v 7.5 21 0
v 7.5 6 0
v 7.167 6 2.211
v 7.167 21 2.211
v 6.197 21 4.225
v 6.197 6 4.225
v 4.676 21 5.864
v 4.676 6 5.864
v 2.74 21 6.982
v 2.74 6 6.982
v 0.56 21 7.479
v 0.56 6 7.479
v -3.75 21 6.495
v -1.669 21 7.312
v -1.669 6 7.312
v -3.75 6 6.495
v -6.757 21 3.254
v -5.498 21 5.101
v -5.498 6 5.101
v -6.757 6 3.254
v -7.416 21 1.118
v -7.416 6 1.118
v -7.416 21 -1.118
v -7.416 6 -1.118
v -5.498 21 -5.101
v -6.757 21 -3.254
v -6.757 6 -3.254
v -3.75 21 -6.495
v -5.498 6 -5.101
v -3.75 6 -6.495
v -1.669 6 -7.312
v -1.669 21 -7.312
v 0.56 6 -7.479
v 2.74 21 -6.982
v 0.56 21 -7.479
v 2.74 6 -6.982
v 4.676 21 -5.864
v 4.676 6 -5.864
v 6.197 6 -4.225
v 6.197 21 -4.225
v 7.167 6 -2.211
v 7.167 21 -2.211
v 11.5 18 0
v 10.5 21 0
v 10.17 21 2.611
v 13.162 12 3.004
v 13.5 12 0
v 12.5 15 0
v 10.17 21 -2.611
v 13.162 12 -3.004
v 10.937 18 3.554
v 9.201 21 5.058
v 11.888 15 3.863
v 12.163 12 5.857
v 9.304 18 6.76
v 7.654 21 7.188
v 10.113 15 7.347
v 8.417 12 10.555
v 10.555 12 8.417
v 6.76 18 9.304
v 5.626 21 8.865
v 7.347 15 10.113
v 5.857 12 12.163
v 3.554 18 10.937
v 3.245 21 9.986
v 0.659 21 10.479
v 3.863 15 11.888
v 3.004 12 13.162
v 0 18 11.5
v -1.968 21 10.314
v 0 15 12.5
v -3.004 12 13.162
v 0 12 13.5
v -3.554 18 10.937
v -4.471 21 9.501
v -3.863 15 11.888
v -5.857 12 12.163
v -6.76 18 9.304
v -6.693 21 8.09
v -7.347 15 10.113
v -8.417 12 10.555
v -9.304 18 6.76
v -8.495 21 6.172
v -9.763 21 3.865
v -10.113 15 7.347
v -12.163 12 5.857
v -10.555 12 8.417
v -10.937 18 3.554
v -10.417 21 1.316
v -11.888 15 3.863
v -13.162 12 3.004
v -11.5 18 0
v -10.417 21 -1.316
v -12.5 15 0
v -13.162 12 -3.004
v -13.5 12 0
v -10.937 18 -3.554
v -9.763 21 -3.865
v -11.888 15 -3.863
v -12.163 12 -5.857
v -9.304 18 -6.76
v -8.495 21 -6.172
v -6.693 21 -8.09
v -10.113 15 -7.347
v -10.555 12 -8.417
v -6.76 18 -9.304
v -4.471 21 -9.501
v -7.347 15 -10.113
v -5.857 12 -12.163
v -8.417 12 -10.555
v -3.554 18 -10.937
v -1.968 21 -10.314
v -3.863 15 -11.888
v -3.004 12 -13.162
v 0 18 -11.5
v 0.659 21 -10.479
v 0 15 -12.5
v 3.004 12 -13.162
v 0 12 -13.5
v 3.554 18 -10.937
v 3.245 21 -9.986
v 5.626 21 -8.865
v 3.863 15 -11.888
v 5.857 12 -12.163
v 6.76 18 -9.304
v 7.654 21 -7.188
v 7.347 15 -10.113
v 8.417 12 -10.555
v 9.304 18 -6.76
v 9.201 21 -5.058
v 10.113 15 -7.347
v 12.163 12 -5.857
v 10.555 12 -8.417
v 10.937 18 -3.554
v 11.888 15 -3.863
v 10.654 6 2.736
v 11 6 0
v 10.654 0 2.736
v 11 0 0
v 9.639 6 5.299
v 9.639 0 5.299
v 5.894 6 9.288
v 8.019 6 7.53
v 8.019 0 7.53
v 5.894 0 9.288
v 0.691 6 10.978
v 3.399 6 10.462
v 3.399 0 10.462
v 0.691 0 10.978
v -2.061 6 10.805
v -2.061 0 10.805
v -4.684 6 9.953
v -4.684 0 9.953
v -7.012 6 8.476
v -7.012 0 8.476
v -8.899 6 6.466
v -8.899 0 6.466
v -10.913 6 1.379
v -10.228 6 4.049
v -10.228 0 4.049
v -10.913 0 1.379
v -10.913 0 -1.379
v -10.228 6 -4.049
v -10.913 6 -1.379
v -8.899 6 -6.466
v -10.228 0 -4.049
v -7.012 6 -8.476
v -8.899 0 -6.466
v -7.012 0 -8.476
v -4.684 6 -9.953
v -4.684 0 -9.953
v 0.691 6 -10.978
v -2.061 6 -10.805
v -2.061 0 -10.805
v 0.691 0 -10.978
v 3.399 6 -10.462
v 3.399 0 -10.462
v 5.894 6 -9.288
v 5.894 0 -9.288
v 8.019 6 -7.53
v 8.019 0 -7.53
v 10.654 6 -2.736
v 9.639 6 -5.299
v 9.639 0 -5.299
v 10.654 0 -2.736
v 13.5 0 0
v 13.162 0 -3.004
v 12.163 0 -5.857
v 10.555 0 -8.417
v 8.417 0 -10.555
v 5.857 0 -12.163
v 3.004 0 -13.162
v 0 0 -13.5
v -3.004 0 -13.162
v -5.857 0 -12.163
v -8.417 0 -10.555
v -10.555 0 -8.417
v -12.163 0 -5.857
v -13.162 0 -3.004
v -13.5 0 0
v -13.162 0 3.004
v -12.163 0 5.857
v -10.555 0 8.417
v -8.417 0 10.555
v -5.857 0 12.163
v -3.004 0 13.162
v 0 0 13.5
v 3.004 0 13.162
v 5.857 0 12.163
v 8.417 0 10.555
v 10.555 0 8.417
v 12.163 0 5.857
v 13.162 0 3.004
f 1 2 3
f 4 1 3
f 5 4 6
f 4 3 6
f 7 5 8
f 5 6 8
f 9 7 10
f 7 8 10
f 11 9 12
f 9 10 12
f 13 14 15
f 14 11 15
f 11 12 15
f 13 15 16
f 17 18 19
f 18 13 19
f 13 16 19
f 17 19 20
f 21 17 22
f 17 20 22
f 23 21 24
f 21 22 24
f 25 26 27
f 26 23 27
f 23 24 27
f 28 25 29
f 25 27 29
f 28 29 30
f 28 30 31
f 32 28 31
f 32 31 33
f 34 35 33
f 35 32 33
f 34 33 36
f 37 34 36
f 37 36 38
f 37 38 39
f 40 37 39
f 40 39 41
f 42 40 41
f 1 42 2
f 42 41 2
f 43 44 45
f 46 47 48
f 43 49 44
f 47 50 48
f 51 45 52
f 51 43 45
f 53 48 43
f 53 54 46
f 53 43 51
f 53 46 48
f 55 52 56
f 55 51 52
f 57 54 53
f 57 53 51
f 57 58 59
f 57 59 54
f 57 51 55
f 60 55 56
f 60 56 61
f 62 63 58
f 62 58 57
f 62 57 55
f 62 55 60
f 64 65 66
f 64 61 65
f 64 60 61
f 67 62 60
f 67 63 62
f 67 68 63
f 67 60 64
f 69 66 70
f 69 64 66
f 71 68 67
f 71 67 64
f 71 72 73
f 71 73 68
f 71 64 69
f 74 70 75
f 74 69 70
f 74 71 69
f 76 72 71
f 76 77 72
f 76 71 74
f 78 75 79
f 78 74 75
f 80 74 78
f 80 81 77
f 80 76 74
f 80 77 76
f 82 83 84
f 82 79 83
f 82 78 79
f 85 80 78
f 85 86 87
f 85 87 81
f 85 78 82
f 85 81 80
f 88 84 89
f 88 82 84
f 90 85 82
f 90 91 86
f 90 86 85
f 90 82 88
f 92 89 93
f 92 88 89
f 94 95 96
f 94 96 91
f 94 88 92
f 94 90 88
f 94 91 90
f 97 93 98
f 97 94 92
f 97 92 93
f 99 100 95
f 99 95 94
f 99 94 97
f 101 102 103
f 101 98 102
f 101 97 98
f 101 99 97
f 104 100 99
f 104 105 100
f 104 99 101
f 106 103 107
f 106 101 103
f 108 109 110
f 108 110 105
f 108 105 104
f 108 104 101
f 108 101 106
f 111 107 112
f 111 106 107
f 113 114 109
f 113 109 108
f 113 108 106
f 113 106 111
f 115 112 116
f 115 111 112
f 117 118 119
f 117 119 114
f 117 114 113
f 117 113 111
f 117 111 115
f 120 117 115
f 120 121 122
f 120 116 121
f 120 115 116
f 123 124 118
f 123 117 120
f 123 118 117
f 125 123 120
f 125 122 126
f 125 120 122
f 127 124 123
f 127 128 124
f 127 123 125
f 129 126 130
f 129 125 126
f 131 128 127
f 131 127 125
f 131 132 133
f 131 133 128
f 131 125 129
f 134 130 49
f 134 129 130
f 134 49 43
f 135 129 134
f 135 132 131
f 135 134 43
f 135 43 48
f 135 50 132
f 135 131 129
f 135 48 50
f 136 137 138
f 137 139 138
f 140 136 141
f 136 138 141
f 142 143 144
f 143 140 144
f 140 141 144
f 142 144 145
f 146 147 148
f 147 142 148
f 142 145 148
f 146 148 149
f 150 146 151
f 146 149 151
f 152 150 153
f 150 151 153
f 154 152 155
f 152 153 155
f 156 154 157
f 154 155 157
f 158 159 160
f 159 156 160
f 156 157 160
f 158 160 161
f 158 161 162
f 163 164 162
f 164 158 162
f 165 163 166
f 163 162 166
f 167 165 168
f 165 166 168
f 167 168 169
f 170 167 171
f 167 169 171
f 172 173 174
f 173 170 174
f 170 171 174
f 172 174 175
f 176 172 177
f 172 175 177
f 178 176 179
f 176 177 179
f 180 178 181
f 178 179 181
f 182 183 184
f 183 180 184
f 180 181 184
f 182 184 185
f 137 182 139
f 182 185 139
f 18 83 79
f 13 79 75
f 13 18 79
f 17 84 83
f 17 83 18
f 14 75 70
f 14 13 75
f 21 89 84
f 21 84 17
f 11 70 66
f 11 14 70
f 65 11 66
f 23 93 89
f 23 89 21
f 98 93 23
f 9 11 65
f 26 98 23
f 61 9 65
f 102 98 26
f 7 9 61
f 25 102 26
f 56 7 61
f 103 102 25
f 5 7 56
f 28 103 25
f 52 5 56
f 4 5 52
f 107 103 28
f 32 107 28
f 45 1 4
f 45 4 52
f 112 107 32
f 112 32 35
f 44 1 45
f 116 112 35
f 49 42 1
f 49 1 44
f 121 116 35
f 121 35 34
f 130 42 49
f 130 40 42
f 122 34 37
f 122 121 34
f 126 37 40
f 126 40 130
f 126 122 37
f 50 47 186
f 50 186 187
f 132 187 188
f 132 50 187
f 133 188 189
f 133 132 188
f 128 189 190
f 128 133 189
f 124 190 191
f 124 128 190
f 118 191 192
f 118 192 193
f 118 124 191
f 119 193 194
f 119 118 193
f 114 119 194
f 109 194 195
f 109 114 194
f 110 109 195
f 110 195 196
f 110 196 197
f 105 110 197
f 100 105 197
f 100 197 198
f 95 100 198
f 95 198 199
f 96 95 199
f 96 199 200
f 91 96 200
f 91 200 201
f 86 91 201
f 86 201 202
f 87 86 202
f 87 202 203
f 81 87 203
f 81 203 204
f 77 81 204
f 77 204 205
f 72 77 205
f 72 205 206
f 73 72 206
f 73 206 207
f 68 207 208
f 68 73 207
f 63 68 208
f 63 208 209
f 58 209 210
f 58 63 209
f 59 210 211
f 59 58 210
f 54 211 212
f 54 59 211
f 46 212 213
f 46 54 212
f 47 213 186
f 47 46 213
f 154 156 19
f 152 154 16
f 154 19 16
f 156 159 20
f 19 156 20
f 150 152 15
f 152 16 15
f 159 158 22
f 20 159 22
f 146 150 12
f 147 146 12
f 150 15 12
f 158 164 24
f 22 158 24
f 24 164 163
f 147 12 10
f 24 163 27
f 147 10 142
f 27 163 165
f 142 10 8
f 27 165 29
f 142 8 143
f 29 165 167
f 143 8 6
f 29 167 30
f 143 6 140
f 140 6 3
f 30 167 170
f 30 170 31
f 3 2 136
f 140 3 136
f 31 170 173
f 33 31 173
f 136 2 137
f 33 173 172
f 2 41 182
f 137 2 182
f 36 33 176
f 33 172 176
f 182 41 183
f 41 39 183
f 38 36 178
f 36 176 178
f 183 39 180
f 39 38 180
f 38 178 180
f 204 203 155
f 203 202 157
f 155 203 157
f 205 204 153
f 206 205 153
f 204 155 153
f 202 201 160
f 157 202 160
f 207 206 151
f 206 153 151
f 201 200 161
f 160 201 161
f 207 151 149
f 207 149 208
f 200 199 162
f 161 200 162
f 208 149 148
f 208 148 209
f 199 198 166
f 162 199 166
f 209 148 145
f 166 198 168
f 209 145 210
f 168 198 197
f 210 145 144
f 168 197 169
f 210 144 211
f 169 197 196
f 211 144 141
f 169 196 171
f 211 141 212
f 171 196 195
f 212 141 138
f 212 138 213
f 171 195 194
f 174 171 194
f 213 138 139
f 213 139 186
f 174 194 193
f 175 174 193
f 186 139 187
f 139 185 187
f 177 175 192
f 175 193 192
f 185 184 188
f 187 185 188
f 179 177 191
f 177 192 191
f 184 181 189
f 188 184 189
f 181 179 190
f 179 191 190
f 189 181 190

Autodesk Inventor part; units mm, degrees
ref_plane "YZ Plane" through (0, 0, 0) normal (1, 0, 0) x (0, 1, 0)
ref_plane "XZ Plane" through (0, 0, 0) normal (0, 1, 0) x (-1, 0, 0)
ref_plane "XY Plane" through (0, 0, 0) normal (0, 0, 1) x (1, 0, 0)
ref_plane "作業平面1" through (-45.0235, 27.1998, 9.5426) normal (0, 0, 1) x (1, 0, 0)
sketch "スケッチ2" plane through (0, 0, 0) normal (0, 0, 1) x (1, 0, 0)
  line L0 (7.5, 21) -> (7.5, 6)
  line L1 (7.5, 6) -> (11, 6)
  line L2 (11, 6) -> (11, 0)
  line L3 (11, 0) -> (13.5, 0)
  line L4 (13.5, 0) -> (13.5, 12)
  line L5 (-2.7, 0) -> (16.2, 0) projected
  line L6 (0, -4.2) -> (0, 25.2) projected
  line L7 (7.5, 21) -> (10.5, 21)
  line L8 (10.5, 21) -> (13.5, 12)
  point P0 (0, 0)
  point P1 (11, 3)
  dimension "d5" = 11
  dimension "d6" = 6
  dimension "d8" = 7.5
  dimension "d9" = 2.5
  dimension "d10" = 12
  dimension "d11" = 15
  dimension "d13" = 3
revolve "回転1" add sketch "スケッチ2" angle 360 about axis through (0, -10, 0) along (0, 1, 0)
properties part number "LimitedView_Parts"
